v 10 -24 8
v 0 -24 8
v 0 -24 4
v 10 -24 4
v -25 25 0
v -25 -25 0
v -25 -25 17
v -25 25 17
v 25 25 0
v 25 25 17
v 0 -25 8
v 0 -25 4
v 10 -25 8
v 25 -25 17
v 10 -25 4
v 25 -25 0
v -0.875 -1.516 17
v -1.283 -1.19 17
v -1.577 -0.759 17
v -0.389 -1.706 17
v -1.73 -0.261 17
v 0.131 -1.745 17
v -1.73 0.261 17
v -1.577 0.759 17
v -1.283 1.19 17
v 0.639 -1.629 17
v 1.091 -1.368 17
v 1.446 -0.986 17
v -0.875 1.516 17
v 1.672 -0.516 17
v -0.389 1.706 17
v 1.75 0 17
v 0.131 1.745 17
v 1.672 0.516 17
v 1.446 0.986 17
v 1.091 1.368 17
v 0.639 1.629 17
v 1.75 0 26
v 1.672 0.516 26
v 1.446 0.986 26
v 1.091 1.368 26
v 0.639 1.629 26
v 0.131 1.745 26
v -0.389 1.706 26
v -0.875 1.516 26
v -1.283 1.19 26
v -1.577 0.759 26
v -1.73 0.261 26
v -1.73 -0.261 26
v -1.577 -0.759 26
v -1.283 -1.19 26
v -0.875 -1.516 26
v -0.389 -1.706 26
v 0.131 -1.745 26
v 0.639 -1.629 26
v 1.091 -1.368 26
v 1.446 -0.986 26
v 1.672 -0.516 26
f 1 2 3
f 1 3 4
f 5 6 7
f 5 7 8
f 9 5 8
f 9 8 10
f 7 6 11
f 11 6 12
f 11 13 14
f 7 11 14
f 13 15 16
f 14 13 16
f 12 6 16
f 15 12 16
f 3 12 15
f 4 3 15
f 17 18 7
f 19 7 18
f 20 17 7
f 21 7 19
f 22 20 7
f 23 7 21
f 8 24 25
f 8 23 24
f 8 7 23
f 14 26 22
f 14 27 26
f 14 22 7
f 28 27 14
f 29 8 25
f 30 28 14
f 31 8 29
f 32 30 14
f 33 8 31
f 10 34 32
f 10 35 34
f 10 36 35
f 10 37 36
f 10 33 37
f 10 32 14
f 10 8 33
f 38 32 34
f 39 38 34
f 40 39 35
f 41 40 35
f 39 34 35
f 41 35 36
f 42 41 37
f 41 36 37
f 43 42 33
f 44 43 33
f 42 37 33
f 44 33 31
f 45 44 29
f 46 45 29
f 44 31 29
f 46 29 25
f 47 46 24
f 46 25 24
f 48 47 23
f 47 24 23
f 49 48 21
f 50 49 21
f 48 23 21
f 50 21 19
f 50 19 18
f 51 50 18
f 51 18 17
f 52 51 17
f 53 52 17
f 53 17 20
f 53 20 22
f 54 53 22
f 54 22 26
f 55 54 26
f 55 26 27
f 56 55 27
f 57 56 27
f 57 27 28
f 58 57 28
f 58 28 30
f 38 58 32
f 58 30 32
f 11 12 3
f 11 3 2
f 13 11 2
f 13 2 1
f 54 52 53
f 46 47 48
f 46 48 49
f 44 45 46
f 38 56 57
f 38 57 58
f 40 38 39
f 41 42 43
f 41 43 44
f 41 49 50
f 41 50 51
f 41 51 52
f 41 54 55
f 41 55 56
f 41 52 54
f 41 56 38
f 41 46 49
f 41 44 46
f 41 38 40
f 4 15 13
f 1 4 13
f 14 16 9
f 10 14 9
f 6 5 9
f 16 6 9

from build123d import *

# Parameters (mm, degrees)
SKETCH_W     = 50
SKETCH_H     = 50
PAD_DEPTH    = 17
SKETCH001_R  = 1.75
PAD001_DEPTH = 9
SKETCH002_W  = 10
SKETCH002_H  = 4
POCKET_DEPTH = 1


with BuildPart() as part:
    # Sketch → Pad (new body)
    with BuildSketch(Plane.XY):
        Rectangle(SKETCH_W, SKETCH_H)
    extrude(amount=PAD_DEPTH)

    # Sketch001 (on Face6 of Pad) → Pad001 (join)
    with BuildSketch(Plane.XY.offset(17)):
        Circle(SKETCH001_R)
    extrude(amount=PAD001_DEPTH)

    # Sketch002 (on Face6 of Pad001) → Pocket (cut)
    with BuildSketch(Plane.XZ.offset(25)):
        with Locations((5, 6)):
            Rectangle(SKETCH002_W, SKETCH002_H)
    extrude(amount=-POCKET_DEPTH, mode=Mode.SUBTRACT)


solid = part.part
